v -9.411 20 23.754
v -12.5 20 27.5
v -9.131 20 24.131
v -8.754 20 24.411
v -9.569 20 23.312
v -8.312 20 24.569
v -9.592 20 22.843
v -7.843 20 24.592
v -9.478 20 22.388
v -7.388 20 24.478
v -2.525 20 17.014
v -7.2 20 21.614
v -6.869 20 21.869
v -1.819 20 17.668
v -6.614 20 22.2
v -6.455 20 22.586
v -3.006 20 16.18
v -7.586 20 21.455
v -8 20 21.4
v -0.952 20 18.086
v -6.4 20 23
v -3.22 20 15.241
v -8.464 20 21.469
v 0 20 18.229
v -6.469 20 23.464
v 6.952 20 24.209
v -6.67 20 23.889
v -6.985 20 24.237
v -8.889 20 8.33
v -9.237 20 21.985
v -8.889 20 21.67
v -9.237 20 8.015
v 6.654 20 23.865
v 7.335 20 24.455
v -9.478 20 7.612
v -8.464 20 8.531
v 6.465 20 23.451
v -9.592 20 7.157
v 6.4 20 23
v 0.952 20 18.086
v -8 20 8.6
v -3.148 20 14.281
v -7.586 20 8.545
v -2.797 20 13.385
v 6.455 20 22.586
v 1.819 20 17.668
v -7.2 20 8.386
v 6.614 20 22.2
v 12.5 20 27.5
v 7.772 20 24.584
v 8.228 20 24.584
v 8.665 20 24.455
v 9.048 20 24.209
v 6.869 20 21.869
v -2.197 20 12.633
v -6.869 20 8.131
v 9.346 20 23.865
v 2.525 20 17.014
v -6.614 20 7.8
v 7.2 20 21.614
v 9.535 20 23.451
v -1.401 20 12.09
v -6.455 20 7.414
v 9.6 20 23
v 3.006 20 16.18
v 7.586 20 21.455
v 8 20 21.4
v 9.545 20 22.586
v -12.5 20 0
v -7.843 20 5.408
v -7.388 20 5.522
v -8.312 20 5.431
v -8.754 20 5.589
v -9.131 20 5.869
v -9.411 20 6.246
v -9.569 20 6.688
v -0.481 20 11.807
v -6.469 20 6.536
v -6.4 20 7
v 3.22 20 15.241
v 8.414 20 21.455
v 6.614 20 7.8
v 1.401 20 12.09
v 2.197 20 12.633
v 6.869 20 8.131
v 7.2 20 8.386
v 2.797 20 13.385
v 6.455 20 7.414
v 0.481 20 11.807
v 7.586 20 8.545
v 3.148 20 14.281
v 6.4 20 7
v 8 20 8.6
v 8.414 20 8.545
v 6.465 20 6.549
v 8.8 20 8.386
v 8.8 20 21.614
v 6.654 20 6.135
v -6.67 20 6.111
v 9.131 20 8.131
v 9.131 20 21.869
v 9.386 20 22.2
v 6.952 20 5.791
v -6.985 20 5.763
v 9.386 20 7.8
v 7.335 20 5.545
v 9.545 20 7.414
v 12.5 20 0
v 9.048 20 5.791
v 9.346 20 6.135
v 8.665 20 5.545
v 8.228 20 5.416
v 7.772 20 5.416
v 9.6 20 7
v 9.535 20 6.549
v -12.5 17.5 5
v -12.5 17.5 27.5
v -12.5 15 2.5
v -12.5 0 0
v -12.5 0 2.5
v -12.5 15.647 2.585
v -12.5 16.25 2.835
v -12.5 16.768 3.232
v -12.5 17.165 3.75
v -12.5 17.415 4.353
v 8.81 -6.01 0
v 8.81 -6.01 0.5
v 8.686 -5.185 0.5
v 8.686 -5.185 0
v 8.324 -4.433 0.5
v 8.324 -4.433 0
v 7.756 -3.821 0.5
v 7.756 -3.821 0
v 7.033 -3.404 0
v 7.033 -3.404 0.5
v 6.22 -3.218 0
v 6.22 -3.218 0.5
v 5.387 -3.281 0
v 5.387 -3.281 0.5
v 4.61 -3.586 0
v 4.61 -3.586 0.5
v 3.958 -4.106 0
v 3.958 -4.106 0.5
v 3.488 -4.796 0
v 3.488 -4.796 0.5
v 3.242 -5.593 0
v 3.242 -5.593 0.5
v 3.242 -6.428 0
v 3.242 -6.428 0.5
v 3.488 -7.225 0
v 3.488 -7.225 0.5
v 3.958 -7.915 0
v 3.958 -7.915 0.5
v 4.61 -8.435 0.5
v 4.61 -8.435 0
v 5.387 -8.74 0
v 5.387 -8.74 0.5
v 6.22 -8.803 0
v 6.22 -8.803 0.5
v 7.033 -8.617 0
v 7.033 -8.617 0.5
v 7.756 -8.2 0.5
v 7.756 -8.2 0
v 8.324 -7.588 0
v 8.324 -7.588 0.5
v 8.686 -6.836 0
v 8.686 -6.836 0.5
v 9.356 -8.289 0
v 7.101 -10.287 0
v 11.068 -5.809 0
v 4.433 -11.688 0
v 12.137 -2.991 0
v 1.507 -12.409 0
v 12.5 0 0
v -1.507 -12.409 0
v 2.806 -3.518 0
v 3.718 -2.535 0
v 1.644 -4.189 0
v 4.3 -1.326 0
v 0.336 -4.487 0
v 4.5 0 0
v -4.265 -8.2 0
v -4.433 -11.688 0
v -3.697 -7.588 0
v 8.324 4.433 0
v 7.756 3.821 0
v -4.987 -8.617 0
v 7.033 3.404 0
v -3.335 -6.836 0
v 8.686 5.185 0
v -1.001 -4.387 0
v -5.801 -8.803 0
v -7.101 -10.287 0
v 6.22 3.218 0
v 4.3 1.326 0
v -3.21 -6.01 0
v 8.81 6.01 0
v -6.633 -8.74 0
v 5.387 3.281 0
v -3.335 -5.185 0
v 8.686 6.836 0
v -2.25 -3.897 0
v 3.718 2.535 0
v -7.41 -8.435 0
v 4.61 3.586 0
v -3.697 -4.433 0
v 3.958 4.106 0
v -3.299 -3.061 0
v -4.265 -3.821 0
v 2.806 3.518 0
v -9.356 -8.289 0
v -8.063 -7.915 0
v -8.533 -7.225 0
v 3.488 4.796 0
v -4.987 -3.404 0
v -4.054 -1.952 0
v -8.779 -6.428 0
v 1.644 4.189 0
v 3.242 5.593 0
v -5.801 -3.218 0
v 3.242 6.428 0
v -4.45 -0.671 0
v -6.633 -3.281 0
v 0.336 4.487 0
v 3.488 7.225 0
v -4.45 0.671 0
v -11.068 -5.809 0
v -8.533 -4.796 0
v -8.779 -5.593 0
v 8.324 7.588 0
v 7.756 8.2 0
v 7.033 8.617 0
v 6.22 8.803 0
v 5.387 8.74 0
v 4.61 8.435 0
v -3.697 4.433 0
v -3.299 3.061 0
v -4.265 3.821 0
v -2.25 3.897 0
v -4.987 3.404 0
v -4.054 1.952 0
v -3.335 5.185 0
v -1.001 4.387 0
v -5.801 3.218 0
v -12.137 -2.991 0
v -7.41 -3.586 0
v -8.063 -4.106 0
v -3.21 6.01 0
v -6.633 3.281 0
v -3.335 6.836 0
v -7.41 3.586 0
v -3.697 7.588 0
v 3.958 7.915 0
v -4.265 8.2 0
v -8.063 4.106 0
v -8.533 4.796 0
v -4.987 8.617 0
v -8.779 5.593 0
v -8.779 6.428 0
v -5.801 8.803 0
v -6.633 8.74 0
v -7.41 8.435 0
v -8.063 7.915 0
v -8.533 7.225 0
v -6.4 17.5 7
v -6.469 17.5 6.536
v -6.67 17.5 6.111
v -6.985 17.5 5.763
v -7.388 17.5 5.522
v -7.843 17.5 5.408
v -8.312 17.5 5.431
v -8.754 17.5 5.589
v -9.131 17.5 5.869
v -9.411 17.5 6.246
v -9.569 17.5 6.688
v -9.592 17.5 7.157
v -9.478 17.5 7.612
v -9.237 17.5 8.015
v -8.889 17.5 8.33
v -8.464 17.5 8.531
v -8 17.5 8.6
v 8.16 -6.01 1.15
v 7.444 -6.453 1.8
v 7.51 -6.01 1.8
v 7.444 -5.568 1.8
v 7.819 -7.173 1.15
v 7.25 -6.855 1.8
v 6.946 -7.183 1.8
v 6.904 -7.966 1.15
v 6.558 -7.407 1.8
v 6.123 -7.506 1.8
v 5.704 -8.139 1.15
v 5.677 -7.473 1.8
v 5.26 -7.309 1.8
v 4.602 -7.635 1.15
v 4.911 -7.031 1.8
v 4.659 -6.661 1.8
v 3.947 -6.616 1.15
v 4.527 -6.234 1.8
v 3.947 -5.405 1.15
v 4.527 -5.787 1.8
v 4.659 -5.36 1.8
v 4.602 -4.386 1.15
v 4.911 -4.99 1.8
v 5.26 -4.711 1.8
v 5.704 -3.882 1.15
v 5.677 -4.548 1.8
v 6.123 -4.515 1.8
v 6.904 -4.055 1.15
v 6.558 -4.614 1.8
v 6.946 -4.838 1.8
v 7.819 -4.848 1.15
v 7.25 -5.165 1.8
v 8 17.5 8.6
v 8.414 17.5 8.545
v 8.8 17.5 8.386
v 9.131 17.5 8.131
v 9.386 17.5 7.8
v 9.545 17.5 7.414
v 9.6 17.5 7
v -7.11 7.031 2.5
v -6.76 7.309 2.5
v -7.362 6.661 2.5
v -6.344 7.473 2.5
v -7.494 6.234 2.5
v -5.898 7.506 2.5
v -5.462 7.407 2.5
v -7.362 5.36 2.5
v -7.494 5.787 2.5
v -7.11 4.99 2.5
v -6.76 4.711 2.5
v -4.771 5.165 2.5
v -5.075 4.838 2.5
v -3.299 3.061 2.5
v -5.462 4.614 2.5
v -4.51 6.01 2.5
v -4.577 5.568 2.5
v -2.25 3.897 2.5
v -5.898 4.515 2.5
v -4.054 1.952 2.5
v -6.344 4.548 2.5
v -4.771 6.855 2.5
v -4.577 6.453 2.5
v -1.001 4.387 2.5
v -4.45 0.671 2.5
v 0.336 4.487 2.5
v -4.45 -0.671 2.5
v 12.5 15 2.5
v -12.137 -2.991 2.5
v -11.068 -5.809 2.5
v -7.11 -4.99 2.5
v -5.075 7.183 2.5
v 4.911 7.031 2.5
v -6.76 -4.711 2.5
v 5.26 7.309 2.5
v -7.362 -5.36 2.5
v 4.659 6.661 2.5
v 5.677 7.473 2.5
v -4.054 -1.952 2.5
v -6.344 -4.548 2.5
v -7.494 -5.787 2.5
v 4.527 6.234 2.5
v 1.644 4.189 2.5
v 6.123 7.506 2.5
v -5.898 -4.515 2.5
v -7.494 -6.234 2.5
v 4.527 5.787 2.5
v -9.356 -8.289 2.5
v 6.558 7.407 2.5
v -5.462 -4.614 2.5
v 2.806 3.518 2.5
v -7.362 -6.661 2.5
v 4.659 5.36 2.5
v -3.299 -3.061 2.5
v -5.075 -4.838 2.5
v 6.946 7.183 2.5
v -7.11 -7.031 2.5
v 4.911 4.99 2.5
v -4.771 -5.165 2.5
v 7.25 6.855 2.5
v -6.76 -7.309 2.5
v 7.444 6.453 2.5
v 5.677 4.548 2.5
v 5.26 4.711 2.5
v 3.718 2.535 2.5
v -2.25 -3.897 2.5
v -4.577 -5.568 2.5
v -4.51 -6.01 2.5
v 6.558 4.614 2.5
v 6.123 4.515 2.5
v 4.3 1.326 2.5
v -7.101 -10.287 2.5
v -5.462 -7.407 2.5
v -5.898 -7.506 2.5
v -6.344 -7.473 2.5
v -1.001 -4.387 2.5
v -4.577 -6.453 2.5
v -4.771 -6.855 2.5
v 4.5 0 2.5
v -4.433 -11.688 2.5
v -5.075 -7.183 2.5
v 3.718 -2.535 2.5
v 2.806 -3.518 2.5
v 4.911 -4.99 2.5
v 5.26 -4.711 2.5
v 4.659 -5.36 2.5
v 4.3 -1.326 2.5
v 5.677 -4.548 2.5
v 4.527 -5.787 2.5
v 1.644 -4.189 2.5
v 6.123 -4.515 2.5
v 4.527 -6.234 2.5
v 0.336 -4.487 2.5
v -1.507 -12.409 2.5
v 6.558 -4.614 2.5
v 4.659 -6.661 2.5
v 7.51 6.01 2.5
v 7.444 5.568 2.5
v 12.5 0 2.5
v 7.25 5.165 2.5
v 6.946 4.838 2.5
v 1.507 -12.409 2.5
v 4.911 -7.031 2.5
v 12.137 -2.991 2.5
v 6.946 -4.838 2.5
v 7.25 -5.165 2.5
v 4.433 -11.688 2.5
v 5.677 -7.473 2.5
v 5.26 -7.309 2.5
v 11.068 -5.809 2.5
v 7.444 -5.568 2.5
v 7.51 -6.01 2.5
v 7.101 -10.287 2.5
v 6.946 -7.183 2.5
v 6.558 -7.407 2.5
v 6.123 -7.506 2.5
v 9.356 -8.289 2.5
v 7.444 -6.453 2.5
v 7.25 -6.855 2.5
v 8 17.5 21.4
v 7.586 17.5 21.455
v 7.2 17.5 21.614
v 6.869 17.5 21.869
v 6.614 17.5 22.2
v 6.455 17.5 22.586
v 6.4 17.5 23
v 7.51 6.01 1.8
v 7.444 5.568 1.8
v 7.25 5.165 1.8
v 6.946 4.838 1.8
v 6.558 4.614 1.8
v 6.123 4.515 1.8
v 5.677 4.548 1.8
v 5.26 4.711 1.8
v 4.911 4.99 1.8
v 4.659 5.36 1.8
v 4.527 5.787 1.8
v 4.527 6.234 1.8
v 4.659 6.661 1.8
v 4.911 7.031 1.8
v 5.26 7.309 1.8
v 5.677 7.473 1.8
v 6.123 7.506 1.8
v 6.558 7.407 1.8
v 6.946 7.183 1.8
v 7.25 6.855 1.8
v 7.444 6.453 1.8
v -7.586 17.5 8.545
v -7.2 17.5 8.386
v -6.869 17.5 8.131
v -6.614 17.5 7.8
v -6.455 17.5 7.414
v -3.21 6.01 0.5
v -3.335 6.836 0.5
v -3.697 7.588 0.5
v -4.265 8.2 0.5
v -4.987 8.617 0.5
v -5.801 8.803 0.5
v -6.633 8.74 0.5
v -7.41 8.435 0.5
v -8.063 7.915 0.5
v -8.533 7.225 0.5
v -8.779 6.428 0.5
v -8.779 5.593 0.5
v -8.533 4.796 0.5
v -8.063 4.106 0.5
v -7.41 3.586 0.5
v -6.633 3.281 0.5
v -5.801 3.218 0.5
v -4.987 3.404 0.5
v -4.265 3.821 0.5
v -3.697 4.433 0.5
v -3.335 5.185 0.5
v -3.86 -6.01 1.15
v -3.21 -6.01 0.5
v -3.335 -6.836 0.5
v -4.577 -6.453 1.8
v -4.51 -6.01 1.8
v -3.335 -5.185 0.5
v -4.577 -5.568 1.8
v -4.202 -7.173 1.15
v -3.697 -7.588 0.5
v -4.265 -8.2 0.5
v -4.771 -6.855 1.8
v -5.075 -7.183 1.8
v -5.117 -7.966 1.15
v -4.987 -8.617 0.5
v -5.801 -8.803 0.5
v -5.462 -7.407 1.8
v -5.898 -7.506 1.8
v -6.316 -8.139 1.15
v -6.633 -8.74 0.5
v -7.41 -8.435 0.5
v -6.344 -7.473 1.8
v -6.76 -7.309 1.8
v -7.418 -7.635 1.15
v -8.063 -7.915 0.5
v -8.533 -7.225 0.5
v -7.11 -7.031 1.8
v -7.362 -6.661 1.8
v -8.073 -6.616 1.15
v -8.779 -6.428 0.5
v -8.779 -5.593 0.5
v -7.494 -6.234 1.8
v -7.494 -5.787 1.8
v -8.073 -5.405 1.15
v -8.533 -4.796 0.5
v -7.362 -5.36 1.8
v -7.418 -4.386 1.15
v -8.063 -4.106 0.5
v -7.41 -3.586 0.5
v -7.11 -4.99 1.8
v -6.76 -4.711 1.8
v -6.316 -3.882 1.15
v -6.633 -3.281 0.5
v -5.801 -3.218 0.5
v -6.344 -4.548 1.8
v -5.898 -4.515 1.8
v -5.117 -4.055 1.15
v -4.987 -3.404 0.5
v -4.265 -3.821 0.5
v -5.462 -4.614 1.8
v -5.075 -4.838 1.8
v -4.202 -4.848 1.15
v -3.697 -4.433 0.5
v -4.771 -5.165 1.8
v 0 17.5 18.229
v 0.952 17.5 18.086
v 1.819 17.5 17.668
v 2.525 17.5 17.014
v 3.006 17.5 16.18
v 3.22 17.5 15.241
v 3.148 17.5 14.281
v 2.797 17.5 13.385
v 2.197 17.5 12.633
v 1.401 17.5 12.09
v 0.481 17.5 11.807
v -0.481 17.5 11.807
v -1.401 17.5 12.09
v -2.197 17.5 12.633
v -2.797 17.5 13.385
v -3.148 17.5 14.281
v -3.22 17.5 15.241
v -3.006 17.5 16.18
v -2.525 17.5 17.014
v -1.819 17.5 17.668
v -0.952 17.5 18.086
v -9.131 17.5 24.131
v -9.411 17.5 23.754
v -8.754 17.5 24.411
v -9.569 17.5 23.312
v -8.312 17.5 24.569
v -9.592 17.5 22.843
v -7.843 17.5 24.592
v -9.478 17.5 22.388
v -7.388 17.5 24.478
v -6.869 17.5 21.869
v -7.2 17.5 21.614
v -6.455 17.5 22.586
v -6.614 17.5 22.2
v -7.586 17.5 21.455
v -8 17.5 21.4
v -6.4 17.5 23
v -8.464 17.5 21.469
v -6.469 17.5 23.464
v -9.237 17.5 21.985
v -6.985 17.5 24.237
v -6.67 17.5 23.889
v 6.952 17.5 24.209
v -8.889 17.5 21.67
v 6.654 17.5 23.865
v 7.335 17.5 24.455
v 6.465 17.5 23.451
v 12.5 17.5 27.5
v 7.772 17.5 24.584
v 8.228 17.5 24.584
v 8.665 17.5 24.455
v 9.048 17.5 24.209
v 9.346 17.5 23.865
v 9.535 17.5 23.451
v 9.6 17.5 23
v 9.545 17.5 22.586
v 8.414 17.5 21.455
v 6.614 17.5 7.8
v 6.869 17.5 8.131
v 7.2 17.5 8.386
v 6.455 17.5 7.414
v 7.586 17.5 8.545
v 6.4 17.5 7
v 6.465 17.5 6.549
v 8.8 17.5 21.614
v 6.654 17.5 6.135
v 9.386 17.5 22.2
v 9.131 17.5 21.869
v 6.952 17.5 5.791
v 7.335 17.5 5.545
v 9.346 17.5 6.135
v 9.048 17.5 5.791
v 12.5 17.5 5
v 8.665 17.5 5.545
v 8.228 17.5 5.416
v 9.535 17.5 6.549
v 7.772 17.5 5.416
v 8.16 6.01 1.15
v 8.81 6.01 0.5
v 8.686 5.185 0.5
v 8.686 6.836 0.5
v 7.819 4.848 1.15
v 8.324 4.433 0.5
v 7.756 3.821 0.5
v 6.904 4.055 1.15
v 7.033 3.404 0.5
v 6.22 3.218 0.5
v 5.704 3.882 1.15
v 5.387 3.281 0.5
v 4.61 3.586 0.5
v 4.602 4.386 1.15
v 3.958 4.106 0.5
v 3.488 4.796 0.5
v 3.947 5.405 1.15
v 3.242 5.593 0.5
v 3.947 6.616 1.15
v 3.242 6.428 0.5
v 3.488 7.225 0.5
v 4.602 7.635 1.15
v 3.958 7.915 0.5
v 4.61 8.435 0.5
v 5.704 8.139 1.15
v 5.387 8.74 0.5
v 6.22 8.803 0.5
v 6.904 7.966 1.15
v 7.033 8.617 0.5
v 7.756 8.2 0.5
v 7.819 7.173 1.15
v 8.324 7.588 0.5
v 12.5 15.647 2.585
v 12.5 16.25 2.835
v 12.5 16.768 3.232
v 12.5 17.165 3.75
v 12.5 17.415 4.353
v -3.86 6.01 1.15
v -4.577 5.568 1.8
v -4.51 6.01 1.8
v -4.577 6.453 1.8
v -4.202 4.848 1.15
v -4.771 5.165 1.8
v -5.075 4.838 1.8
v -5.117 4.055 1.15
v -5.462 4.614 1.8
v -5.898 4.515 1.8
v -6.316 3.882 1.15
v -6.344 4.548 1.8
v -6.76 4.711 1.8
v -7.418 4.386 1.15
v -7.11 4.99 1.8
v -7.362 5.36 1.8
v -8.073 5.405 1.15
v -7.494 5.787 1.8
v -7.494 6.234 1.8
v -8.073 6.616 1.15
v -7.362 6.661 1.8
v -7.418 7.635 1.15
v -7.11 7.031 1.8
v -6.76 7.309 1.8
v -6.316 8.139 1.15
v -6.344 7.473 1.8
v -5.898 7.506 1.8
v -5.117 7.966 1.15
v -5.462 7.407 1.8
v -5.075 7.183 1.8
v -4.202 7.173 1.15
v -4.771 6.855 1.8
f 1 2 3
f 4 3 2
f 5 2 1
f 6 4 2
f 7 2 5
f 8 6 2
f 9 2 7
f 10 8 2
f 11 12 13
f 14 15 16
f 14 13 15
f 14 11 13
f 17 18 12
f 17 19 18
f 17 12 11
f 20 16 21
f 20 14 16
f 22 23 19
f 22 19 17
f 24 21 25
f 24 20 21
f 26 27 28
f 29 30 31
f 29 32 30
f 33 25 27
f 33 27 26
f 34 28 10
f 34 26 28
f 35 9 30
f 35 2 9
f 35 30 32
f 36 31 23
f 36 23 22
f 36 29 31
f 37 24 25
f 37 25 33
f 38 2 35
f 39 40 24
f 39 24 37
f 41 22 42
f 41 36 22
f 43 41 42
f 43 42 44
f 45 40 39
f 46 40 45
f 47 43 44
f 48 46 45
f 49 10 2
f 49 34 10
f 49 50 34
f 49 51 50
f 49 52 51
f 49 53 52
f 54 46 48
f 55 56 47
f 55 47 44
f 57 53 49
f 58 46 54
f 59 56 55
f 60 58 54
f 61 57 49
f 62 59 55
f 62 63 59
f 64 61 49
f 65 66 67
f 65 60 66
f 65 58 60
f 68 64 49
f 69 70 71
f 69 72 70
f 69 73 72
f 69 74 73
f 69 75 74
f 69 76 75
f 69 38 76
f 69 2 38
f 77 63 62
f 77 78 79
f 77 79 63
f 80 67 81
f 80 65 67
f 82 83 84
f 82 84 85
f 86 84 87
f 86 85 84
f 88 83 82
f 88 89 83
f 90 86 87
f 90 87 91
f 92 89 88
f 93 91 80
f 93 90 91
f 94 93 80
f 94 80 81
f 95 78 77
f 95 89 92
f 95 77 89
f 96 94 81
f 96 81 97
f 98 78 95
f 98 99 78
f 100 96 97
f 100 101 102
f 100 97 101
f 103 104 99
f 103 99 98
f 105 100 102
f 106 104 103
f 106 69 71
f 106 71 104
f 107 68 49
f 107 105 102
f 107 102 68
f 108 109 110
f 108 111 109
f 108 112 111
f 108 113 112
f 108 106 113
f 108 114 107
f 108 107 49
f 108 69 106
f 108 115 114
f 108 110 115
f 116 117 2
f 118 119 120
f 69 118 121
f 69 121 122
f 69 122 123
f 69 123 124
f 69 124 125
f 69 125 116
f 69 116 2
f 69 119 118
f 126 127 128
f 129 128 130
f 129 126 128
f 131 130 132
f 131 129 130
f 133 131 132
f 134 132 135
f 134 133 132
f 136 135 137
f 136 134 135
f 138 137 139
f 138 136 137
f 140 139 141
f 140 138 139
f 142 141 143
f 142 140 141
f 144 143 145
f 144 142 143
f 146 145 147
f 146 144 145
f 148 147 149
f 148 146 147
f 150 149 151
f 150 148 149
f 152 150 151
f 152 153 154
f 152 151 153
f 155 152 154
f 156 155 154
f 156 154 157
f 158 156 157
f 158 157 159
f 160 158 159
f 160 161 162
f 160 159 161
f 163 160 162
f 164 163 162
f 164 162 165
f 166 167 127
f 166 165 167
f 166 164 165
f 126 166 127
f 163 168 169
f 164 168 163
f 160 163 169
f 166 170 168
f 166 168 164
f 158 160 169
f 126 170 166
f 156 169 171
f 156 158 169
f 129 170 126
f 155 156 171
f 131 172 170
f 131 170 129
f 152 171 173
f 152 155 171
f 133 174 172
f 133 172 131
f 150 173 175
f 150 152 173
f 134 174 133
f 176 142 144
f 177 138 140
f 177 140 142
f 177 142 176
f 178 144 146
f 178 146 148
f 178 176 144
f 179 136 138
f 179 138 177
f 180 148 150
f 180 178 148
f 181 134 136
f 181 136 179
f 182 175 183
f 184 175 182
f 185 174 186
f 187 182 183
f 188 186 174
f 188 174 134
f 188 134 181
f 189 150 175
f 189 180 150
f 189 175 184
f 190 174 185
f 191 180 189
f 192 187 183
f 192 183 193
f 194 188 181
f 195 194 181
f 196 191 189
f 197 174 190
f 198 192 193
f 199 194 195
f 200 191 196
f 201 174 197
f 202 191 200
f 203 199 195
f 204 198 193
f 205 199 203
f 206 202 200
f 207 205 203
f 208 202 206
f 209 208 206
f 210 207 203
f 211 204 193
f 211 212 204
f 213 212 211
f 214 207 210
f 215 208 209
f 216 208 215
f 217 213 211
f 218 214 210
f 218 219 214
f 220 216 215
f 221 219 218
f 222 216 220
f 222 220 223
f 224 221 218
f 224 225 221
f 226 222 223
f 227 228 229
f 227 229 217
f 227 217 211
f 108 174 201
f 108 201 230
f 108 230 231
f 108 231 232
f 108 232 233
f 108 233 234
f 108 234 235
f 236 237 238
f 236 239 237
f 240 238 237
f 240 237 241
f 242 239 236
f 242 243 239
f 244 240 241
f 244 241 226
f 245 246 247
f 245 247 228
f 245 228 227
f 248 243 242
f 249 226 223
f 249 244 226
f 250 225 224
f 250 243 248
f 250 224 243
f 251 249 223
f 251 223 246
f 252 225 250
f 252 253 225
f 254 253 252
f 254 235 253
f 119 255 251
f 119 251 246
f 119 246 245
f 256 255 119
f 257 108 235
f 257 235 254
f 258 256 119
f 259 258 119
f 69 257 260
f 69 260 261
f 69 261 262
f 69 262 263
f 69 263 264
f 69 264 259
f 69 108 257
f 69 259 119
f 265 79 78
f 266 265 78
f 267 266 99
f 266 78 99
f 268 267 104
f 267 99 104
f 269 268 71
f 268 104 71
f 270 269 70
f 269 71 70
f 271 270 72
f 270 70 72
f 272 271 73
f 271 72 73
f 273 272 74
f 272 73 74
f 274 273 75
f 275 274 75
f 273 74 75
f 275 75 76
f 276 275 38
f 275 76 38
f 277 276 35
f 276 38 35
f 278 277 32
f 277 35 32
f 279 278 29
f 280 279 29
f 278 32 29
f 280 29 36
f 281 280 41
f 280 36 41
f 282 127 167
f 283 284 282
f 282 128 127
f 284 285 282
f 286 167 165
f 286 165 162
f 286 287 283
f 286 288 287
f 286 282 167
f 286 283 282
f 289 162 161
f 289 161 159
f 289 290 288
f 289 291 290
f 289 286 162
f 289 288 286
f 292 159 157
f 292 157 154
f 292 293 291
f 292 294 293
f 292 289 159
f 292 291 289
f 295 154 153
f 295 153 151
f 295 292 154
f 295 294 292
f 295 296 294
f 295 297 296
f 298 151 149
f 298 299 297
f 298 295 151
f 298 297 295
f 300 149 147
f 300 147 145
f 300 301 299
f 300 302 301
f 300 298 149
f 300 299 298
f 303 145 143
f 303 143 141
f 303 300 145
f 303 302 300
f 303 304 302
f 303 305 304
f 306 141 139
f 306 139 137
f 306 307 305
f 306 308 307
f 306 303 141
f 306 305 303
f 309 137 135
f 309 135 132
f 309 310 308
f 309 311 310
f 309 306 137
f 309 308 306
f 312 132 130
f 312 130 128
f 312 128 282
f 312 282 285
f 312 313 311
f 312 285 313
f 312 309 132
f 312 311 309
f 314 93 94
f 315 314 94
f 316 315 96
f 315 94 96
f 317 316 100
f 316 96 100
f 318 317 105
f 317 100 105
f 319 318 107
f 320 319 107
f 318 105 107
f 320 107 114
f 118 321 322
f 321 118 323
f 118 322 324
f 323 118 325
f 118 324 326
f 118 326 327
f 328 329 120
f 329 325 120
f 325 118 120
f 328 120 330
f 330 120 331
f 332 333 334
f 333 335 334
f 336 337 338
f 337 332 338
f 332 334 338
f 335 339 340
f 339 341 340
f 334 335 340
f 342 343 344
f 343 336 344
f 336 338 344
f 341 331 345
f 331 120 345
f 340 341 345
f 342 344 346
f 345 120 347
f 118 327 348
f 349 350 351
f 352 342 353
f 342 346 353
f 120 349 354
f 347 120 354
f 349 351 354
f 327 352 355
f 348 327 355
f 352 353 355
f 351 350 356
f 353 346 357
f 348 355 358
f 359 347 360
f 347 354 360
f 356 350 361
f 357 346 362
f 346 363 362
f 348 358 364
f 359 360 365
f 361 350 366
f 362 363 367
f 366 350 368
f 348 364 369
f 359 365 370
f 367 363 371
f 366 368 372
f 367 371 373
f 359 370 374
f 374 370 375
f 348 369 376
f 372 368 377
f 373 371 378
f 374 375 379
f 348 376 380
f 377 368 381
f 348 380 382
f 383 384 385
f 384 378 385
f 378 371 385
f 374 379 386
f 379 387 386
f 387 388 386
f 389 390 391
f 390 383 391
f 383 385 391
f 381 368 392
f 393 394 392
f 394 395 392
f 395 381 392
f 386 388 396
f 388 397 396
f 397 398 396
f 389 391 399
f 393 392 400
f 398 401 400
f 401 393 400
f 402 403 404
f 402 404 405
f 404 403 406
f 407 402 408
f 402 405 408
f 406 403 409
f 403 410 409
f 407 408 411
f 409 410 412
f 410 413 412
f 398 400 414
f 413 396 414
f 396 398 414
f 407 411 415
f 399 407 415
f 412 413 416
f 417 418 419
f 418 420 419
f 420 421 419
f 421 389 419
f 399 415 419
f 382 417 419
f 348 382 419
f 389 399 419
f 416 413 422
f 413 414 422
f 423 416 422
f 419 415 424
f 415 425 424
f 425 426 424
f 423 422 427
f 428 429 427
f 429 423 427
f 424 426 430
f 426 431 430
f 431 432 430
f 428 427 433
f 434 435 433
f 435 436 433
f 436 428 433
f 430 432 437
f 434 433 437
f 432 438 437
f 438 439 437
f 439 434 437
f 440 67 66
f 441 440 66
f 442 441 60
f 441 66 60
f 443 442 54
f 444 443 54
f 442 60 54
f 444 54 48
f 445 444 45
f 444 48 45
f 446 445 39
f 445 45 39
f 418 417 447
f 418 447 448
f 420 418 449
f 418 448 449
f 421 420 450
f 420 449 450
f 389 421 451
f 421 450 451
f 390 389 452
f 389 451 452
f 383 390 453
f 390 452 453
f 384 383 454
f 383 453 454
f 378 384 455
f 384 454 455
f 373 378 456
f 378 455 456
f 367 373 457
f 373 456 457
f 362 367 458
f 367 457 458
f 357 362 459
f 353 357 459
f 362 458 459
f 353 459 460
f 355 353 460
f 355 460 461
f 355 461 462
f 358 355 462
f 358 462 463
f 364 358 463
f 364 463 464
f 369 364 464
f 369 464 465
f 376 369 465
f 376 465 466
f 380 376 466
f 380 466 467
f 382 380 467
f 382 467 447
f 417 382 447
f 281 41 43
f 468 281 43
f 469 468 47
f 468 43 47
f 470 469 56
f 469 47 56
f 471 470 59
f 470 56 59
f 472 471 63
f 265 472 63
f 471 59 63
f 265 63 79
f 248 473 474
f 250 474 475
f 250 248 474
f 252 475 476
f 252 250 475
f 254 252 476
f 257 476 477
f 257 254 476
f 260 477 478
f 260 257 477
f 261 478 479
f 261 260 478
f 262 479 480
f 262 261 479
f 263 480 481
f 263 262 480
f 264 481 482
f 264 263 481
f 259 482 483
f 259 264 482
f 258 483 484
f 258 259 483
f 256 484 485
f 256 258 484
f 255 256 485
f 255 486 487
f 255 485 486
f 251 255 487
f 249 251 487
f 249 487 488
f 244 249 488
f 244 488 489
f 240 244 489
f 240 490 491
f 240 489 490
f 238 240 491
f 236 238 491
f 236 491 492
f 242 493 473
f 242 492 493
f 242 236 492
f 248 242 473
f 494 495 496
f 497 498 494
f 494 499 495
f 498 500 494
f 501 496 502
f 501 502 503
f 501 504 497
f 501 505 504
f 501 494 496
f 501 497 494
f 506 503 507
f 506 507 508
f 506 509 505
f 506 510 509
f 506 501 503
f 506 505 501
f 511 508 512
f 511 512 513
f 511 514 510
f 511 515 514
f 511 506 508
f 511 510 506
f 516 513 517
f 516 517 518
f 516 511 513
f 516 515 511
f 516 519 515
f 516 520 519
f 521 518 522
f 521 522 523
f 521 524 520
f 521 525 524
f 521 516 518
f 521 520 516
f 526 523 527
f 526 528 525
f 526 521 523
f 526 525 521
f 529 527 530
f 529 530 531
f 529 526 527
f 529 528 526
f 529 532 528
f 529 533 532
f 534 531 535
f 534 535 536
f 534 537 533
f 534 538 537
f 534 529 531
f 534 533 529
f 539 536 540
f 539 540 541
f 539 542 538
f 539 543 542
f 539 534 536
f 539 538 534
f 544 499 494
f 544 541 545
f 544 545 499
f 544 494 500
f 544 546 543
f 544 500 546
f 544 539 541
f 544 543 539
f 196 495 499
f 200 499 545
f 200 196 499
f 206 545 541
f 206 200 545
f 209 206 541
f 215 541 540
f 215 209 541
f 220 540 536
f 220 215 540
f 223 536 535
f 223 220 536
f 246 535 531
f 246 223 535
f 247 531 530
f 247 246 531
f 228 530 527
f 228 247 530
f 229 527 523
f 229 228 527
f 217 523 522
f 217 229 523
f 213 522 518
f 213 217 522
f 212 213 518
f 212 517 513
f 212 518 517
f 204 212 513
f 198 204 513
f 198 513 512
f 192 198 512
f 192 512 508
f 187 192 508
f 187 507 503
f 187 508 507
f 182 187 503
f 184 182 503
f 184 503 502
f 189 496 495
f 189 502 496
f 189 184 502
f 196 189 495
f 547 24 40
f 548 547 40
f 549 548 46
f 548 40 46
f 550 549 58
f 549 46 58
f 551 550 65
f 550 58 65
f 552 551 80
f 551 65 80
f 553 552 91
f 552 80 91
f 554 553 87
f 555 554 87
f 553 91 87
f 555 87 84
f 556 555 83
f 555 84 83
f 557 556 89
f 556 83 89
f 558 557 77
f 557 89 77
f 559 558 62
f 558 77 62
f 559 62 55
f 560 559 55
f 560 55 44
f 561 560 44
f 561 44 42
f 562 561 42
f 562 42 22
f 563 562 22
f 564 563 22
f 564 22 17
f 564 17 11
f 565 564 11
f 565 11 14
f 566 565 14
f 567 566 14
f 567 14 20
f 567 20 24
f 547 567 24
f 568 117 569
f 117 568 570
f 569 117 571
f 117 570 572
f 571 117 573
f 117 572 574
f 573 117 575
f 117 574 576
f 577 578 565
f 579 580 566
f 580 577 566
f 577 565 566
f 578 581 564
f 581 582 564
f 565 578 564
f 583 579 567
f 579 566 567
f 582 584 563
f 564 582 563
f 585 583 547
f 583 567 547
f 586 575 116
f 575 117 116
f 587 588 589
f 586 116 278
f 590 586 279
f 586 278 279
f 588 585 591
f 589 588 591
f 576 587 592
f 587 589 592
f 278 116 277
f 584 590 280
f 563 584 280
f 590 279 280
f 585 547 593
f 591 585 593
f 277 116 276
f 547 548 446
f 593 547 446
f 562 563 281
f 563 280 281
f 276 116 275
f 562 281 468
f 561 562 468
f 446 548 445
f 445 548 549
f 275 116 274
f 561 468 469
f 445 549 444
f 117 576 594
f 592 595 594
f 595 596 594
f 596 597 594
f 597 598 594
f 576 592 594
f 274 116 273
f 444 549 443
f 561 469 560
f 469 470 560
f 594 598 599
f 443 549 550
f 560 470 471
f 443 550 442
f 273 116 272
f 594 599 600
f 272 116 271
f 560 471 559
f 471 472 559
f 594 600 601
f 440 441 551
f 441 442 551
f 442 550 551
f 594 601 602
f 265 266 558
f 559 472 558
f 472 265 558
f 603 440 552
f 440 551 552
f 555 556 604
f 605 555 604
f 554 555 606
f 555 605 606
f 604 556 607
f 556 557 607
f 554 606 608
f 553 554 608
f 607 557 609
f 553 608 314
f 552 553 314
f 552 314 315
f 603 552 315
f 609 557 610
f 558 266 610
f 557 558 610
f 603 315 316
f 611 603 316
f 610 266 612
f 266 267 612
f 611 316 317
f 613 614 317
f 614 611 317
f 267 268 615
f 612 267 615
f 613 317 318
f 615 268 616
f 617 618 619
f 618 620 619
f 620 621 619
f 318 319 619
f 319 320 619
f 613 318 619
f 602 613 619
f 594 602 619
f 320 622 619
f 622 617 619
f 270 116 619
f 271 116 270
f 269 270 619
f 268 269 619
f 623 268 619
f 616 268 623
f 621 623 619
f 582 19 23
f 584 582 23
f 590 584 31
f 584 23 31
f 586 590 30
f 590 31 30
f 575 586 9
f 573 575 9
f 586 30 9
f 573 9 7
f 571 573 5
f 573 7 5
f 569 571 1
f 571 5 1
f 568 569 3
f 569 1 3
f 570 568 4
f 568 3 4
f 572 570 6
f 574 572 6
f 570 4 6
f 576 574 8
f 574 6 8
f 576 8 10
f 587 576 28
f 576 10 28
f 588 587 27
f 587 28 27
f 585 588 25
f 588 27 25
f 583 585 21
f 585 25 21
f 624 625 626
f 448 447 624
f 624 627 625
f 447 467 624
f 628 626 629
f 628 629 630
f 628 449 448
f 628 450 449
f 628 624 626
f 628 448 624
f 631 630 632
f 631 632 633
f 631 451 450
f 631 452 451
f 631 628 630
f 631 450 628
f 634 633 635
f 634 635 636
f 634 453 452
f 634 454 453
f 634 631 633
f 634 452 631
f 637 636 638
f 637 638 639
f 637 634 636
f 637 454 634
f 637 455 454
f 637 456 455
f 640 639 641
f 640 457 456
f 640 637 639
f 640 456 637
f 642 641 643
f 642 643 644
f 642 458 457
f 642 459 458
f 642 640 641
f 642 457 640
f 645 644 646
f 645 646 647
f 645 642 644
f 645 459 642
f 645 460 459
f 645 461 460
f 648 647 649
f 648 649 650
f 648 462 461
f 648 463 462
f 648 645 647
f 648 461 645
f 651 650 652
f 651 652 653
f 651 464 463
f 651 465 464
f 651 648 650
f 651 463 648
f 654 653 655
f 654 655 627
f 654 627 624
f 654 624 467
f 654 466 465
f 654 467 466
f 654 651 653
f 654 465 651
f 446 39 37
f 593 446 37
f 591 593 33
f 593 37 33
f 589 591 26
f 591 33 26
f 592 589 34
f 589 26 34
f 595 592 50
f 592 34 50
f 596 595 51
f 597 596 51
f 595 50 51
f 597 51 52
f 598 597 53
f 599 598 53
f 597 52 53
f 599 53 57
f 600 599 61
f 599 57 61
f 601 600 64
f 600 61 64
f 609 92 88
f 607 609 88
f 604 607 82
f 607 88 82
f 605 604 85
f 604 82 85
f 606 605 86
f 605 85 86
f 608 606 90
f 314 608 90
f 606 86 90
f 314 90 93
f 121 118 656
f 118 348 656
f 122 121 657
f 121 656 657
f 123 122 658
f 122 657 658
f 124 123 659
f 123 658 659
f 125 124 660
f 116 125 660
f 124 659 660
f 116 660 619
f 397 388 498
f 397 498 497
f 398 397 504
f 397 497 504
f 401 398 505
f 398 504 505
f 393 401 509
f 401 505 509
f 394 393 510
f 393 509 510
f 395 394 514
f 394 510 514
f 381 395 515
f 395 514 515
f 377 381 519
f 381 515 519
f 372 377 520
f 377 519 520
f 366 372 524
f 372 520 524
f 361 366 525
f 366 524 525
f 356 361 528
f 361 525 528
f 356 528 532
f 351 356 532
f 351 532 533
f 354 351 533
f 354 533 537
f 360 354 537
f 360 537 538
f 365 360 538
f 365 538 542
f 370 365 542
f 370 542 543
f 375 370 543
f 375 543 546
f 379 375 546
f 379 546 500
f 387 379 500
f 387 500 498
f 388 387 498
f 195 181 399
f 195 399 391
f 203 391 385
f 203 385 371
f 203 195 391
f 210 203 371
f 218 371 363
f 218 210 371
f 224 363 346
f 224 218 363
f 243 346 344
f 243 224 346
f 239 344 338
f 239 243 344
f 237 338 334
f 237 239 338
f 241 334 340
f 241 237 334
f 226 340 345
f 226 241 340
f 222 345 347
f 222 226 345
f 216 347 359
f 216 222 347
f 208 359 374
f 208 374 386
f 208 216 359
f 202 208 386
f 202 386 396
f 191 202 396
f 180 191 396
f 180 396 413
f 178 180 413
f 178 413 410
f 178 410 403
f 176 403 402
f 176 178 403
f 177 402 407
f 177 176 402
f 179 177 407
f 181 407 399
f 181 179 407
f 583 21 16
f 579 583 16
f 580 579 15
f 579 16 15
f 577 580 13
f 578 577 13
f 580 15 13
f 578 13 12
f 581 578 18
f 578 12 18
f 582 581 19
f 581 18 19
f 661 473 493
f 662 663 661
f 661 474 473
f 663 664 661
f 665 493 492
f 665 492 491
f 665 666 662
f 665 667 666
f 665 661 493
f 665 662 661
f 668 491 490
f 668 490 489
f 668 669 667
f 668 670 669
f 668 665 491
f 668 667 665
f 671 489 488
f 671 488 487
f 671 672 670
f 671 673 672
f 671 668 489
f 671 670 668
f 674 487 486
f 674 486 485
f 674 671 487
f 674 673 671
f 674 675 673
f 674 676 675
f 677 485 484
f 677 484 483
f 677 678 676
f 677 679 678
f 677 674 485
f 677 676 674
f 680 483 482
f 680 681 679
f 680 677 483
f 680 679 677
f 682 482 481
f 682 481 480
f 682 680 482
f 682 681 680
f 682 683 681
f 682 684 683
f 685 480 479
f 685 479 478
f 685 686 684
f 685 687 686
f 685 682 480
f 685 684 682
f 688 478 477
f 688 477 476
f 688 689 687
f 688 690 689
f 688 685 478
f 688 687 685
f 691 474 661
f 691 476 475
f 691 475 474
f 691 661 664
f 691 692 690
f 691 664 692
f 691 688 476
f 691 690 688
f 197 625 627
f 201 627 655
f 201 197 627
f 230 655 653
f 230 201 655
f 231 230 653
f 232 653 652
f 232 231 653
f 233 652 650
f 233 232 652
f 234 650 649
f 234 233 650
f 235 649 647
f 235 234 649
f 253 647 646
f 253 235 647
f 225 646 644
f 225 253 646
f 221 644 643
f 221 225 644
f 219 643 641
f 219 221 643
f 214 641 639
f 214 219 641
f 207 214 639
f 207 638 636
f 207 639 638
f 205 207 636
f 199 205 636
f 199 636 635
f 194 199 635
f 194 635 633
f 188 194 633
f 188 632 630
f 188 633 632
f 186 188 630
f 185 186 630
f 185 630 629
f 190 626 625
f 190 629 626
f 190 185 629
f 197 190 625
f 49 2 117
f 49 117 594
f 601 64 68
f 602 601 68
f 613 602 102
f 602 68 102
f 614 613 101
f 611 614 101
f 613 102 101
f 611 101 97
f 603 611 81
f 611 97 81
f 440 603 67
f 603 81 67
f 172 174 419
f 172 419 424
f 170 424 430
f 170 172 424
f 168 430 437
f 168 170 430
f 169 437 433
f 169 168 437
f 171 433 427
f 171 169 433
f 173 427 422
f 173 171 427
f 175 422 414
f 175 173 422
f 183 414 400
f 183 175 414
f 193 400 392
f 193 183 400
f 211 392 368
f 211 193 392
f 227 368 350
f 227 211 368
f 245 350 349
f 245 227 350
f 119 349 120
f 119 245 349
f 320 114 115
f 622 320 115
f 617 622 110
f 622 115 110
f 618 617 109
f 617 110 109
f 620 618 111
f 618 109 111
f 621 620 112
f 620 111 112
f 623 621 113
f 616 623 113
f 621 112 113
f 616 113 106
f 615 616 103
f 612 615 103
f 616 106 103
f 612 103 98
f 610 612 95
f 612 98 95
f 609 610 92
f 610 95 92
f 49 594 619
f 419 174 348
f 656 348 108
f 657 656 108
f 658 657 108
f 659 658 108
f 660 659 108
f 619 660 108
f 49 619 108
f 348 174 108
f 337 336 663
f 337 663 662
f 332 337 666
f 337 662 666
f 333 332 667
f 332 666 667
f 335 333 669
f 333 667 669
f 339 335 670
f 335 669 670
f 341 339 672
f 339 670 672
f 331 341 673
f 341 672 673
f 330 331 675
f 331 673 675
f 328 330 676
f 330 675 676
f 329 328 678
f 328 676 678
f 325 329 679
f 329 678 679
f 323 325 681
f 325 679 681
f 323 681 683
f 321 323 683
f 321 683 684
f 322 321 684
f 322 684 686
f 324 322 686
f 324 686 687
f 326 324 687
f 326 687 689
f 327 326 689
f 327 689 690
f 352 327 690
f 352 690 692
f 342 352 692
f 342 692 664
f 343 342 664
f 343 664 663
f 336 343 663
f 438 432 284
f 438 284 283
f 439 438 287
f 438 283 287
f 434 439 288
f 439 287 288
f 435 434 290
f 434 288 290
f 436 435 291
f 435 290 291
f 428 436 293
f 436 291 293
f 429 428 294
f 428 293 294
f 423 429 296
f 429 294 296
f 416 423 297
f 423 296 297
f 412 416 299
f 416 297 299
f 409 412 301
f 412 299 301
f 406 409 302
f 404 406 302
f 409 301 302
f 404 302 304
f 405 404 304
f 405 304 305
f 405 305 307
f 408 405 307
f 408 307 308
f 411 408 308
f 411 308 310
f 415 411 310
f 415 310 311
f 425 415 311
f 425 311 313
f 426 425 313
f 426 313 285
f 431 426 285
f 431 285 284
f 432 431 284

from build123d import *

# Parameters (mm, degrees)
SKETCH1_R           = 2.8
SKETCH1_R_2         = 4.5
BOSS_EXTRUDE1_DEPTH = 2.5
SKETCH2_W           = 25
SKETCH2_H           = 2.5
BOSS_EXTRUDE2_DEPTH = 25
FILLET1_R           = 2.5
SKETCH4_R           = 3.229450522
CUT_EXTRUDE1_DEPTH  = 10
BOSS_EXTRUDE3_START = -2
SKETCH3_R           = 2.8
SKETCH3_R_2         = 1.5
BOSS_EXTRUDE3_DEPTH = 0.5
CHAMFER4_SIZE       = 1.5


with BuildPart() as part:
    # Sketch1 → Boss-Extrude1 (new body)
    with BuildSketch(Plane.XY):
        with BuildLine():
            Line((-12.5, 0), (-12.5, 20))
            Line((-12.5, 20), (12.5, 20))
            Line((12.5, 20), (12.5, 0))
            ThreePointArc((12.5, 0), (0, -12.5), (-12.5, 0))
        make_face()
        with Locations((-6.01040764, 6.01040764)):
            Circle(SKETCH1_R, mode=Mode.SUBTRACT)
        with Locations((-6.01040764, -6.01040764)):
            Circle(SKETCH1_R, mode=Mode.SUBTRACT)
        with Locations((6.01040764, -6.01040764)):
            Circle(SKETCH1_R, mode=Mode.SUBTRACT)
        with Locations((6.01040764, 6.01040764)):
            Circle(SKETCH1_R, mode=Mode.SUBTRACT)
        Circle(SKETCH1_R_2, mode=Mode.SUBTRACT)
    extrude(amount=BOSS_EXTRUDE1_DEPTH)

    # Sketch2 → Boss-Extrude2 (add)
    with BuildSketch(Plane.XY.offset(2.5)):
        with Locations((0, 18.75)):
            Rectangle(SKETCH2_W, SKETCH2_H)
    extrude(amount=BOSS_EXTRUDE2_DEPTH)

    # Fillet1
    fillet1_edges = [part.edges().sort_by_distance(p)[0] for p in [
        (0, 17.5, 2.5),
    ]]
    fillet(fillet1_edges, radius=FILLET1_R)

    # Sketch4 → Cut-Extrude1 (cut)
    with BuildSketch(Plane(origin=(0, 20, 0), x_dir=(1, 0, 0), z_dir=(0, 1, 0))):
        with BuildLine():
            ThreePointArc((-8, -21.4), (-9.13137085, -24.13137085), (-6.4, -23))
            Line((-6.4, -23), (-8, -23))
            Line((-8, -23), (-8, -21.4))
        make_face()
        with BuildLine():
            Line((-8, -23), (-6.4, -23))
            ThreePointArc((-6.4, -23), (-6.86862915, -21.86862915), (-8, -21.4))
            Line((-8, -21.4), (-8, -23))
        make_face()
        with BuildLine():
            ThreePointArc((8, -21.4), (6.86862915, -21.86862915), (6.4, -23))
            Line((6.4, -23), (8, -23))
            Line((8, -23), (8, -21.4))
        make_face()
        with BuildLine():
            Line((8, -23), (6.4, -23))
            ThreePointArc((6.4, -23), (8, -24.6), (9.6, -23))
            ThreePointArc((9.6, -23), (9.13137085, -21.86862915), (8, -21.4))
            Line((8, -21.4), (8, -23))
        make_face()
        with BuildLine():
            ThreePointArc((6.4, -7), (6.86862915, -8.13137085), (8, -8.6))
            Line((8, -8.6), (8, -7))
            Line((8, -7), (6.4, -7))
        make_face()
        with BuildLine():
            Line((8, -7), (8, -8.6))
            ThreePointArc((8, -8.6), (9.13137085, -8.13137085), (9.6, -7))
            ThreePointArc((9.6, -7), (8, -5.4), (6.4, -7))
            Line((6.4, -7), (8, -7))
        make_face()
        with Locations(Location((0, -15, 0), (0, 0, 270))):
            Circle(SKETCH4_R)
        with BuildLine():
            ThreePointArc((-6.4, -7), (-9.13137085, -5.86862915), (-8, -8.6))
            Line((-8, -8.6), (-8, -7))
            Line((-8, -7), (-6.4, -7))
        make_face()
        with BuildLine():
            Line((-8, -7), (-8, -8.6))
            ThreePointArc((-8, -8.6), (-6.86862915, -8.13137085), (-6.4, -7))
            Line((-6.4, -7), (-8, -7))
        make_face()
    extrude(amount=-CUT_EXTRUDE1_DEPTH, mode=Mode.SUBTRACT)

    # Sketch3 → Boss-Extrude3 (add)
    # profile 1 of 4: a face of its own
    with BuildSketch(Plane(origin=(0, 0, 0), x_dir=(-1, 0, 0), z_dir=(0, 0, -1)).offset(BOSS_EXTRUDE3_START)):
        with Locations(Location((-6.01040764, 6.01040764, 0), (0, 0, 180))):
            Circle(SKETCH3_R)
        with Locations(Location((-6.01040764, 6.01040764, 0), (0, 0, 180))):
            Circle(SKETCH3_R_2, mode=Mode.SUBTRACT)
    # profile 2 of 4: a face of its own
    with BuildSketch(Plane(origin=(0, 0, 0), x_dir=(-1, 0, 0), z_dir=(0, 0, -1)).offset(BOSS_EXTRUDE3_START)):
        with Locations(Location((6.01040764, 6.01040764, 0), (0, 0, 180))):
            Circle(SKETCH3_R)
        with Locations(Location((6.01040764, 6.01040764, 0), (0, 0, 180))):
            Circle(SKETCH3_R_2, mode=Mode.SUBTRACT)
    # profile 3 of 4: a face of its own
    with BuildSketch(Plane(origin=(0, 0, 0), x_dir=(-1, 0, 0), z_dir=(0, 0, -1)).offset(BOSS_EXTRUDE3_START)):
        with Locations(Location((6.01040764, -6.01040764, 0), (0, 0, 180))):
            Circle(SKETCH3_R)
        with Locations(Location((6.01040764, -6.01040764, 0), (0, 0, 180))):
            Circle(SKETCH3_R_2, mode=Mode.SUBTRACT)
    # profile 4 of 4: a face of its own
    with BuildSketch(Plane(origin=(0, 0, 0), x_dir=(-1, 0, 0), z_dir=(0, 0, -1)).offset(BOSS_EXTRUDE3_START)):
        with Locations(Location((-6.01040764, -6.01040764, 0), (0, 0, 180))):
            Circle(SKETCH3_R)
        with Locations(Location((-6.01040764, -6.01040764, 0), (0, 0, 180))):
            Circle(SKETCH3_R_2, mode=Mode.SUBTRACT)
    extrude(amount=-BOSS_EXTRUDE3_DEPTH)

    # Chamfer4
    # the kernel refuses this chamfer: 1.5 mm, written as the material it adds along each edge
    with BuildSketch(Plane(origin=(6.01040764, 6.01040764, 2), x_dir=(1, 0, 0), z_dir=(0, 1, 0))) as chamfer4_piece_1_section:
        Polygon((2.8, CHAMFER4_SIZE), (2.8 - CHAMFER4_SIZE, 0), (2.8, 0), align=None)
    chamfer4_piece_1 = revolve(axis=Axis((6.01040764, 6.01040764, 2), (0, 0, -1)), mode=Mode.PRIVATE)
    chamfer4_piece_1 = chamfer4_piece_1 - Plane(origin=(6.01040764, 6.01040764, 1.147189391), x_dir=(1, 0, 0), z_dir=(0, 0, -1)) * Cylinder(1.5, 12, mode=Mode.PRIVATE)
    add(chamfer4_piece_1)
    with BuildSketch(Plane(origin=(-6.01040764, -6.01040764, 2), x_dir=(1, 0, 0), z_dir=(0, 1, 0))) as chamfer4_piece_2_section:
        Polygon((2.8, CHAMFER4_SIZE), (2.8 - CHAMFER4_SIZE, 0), (2.8, 0), align=None)
    chamfer4_piece_2 = revolve(axis=Axis((-6.01040764, -6.01040764, 2), (0, 0, -1)), mode=Mode.PRIVATE)
    chamfer4_piece_2 = chamfer4_piece_2 - Plane(origin=(-6.01040764, -6.01040764, 1.147189391), x_dir=(1, 0, 0), z_dir=(0, 0, -1)) * Cylinder(1.5, 12, mode=Mode.PRIVATE)
    add(chamfer4_piece_2)
    with BuildSketch(Plane(origin=(6.01040764, -6.01040764, 2), x_dir=(1, 0, 0), z_dir=(0, 1, 0))) as chamfer4_piece_3_section:
        Polygon((2.8, CHAMFER4_SIZE), (2.8 - CHAMFER4_SIZE, 0), (2.8, 0), align=None)
    chamfer4_piece_3 = revolve(axis=Axis((6.01040764, -6.01040764, 2), (0, 0, -1)), mode=Mode.PRIVATE)
    chamfer4_piece_3 = chamfer4_piece_3 - Plane(origin=(6.01040764, -6.01040764, 1.147189391), x_dir=(1, 0, 0), z_dir=(0, 0, -1)) * Cylinder(1.5, 12, mode=Mode.PRIVATE)
    add(chamfer4_piece_3)
    with BuildSketch(Plane(origin=(-6.01040764, 6.01040764, 2), x_dir=(1, 0, 0), z_dir=(0, 1, 0))) as chamfer4_piece_4_section:
        Polygon((2.8, CHAMFER4_SIZE), (2.8 - CHAMFER4_SIZE, 0), (2.8, 0), align=None)
    chamfer4_piece_4 = revolve(axis=Axis((-6.01040764, 6.01040764, 2), (0, 0, -1)), mode=Mode.PRIVATE)
    chamfer4_piece_4 = chamfer4_piece_4 - Plane(origin=(-6.01040764, 6.01040764, 1.147189391), x_dir=(1, 0, 0), z_dir=(0, 0, -1)) * Cylinder(1.5, 12, mode=Mode.PRIVATE)
    add(chamfer4_piece_4)


solid = part.part
